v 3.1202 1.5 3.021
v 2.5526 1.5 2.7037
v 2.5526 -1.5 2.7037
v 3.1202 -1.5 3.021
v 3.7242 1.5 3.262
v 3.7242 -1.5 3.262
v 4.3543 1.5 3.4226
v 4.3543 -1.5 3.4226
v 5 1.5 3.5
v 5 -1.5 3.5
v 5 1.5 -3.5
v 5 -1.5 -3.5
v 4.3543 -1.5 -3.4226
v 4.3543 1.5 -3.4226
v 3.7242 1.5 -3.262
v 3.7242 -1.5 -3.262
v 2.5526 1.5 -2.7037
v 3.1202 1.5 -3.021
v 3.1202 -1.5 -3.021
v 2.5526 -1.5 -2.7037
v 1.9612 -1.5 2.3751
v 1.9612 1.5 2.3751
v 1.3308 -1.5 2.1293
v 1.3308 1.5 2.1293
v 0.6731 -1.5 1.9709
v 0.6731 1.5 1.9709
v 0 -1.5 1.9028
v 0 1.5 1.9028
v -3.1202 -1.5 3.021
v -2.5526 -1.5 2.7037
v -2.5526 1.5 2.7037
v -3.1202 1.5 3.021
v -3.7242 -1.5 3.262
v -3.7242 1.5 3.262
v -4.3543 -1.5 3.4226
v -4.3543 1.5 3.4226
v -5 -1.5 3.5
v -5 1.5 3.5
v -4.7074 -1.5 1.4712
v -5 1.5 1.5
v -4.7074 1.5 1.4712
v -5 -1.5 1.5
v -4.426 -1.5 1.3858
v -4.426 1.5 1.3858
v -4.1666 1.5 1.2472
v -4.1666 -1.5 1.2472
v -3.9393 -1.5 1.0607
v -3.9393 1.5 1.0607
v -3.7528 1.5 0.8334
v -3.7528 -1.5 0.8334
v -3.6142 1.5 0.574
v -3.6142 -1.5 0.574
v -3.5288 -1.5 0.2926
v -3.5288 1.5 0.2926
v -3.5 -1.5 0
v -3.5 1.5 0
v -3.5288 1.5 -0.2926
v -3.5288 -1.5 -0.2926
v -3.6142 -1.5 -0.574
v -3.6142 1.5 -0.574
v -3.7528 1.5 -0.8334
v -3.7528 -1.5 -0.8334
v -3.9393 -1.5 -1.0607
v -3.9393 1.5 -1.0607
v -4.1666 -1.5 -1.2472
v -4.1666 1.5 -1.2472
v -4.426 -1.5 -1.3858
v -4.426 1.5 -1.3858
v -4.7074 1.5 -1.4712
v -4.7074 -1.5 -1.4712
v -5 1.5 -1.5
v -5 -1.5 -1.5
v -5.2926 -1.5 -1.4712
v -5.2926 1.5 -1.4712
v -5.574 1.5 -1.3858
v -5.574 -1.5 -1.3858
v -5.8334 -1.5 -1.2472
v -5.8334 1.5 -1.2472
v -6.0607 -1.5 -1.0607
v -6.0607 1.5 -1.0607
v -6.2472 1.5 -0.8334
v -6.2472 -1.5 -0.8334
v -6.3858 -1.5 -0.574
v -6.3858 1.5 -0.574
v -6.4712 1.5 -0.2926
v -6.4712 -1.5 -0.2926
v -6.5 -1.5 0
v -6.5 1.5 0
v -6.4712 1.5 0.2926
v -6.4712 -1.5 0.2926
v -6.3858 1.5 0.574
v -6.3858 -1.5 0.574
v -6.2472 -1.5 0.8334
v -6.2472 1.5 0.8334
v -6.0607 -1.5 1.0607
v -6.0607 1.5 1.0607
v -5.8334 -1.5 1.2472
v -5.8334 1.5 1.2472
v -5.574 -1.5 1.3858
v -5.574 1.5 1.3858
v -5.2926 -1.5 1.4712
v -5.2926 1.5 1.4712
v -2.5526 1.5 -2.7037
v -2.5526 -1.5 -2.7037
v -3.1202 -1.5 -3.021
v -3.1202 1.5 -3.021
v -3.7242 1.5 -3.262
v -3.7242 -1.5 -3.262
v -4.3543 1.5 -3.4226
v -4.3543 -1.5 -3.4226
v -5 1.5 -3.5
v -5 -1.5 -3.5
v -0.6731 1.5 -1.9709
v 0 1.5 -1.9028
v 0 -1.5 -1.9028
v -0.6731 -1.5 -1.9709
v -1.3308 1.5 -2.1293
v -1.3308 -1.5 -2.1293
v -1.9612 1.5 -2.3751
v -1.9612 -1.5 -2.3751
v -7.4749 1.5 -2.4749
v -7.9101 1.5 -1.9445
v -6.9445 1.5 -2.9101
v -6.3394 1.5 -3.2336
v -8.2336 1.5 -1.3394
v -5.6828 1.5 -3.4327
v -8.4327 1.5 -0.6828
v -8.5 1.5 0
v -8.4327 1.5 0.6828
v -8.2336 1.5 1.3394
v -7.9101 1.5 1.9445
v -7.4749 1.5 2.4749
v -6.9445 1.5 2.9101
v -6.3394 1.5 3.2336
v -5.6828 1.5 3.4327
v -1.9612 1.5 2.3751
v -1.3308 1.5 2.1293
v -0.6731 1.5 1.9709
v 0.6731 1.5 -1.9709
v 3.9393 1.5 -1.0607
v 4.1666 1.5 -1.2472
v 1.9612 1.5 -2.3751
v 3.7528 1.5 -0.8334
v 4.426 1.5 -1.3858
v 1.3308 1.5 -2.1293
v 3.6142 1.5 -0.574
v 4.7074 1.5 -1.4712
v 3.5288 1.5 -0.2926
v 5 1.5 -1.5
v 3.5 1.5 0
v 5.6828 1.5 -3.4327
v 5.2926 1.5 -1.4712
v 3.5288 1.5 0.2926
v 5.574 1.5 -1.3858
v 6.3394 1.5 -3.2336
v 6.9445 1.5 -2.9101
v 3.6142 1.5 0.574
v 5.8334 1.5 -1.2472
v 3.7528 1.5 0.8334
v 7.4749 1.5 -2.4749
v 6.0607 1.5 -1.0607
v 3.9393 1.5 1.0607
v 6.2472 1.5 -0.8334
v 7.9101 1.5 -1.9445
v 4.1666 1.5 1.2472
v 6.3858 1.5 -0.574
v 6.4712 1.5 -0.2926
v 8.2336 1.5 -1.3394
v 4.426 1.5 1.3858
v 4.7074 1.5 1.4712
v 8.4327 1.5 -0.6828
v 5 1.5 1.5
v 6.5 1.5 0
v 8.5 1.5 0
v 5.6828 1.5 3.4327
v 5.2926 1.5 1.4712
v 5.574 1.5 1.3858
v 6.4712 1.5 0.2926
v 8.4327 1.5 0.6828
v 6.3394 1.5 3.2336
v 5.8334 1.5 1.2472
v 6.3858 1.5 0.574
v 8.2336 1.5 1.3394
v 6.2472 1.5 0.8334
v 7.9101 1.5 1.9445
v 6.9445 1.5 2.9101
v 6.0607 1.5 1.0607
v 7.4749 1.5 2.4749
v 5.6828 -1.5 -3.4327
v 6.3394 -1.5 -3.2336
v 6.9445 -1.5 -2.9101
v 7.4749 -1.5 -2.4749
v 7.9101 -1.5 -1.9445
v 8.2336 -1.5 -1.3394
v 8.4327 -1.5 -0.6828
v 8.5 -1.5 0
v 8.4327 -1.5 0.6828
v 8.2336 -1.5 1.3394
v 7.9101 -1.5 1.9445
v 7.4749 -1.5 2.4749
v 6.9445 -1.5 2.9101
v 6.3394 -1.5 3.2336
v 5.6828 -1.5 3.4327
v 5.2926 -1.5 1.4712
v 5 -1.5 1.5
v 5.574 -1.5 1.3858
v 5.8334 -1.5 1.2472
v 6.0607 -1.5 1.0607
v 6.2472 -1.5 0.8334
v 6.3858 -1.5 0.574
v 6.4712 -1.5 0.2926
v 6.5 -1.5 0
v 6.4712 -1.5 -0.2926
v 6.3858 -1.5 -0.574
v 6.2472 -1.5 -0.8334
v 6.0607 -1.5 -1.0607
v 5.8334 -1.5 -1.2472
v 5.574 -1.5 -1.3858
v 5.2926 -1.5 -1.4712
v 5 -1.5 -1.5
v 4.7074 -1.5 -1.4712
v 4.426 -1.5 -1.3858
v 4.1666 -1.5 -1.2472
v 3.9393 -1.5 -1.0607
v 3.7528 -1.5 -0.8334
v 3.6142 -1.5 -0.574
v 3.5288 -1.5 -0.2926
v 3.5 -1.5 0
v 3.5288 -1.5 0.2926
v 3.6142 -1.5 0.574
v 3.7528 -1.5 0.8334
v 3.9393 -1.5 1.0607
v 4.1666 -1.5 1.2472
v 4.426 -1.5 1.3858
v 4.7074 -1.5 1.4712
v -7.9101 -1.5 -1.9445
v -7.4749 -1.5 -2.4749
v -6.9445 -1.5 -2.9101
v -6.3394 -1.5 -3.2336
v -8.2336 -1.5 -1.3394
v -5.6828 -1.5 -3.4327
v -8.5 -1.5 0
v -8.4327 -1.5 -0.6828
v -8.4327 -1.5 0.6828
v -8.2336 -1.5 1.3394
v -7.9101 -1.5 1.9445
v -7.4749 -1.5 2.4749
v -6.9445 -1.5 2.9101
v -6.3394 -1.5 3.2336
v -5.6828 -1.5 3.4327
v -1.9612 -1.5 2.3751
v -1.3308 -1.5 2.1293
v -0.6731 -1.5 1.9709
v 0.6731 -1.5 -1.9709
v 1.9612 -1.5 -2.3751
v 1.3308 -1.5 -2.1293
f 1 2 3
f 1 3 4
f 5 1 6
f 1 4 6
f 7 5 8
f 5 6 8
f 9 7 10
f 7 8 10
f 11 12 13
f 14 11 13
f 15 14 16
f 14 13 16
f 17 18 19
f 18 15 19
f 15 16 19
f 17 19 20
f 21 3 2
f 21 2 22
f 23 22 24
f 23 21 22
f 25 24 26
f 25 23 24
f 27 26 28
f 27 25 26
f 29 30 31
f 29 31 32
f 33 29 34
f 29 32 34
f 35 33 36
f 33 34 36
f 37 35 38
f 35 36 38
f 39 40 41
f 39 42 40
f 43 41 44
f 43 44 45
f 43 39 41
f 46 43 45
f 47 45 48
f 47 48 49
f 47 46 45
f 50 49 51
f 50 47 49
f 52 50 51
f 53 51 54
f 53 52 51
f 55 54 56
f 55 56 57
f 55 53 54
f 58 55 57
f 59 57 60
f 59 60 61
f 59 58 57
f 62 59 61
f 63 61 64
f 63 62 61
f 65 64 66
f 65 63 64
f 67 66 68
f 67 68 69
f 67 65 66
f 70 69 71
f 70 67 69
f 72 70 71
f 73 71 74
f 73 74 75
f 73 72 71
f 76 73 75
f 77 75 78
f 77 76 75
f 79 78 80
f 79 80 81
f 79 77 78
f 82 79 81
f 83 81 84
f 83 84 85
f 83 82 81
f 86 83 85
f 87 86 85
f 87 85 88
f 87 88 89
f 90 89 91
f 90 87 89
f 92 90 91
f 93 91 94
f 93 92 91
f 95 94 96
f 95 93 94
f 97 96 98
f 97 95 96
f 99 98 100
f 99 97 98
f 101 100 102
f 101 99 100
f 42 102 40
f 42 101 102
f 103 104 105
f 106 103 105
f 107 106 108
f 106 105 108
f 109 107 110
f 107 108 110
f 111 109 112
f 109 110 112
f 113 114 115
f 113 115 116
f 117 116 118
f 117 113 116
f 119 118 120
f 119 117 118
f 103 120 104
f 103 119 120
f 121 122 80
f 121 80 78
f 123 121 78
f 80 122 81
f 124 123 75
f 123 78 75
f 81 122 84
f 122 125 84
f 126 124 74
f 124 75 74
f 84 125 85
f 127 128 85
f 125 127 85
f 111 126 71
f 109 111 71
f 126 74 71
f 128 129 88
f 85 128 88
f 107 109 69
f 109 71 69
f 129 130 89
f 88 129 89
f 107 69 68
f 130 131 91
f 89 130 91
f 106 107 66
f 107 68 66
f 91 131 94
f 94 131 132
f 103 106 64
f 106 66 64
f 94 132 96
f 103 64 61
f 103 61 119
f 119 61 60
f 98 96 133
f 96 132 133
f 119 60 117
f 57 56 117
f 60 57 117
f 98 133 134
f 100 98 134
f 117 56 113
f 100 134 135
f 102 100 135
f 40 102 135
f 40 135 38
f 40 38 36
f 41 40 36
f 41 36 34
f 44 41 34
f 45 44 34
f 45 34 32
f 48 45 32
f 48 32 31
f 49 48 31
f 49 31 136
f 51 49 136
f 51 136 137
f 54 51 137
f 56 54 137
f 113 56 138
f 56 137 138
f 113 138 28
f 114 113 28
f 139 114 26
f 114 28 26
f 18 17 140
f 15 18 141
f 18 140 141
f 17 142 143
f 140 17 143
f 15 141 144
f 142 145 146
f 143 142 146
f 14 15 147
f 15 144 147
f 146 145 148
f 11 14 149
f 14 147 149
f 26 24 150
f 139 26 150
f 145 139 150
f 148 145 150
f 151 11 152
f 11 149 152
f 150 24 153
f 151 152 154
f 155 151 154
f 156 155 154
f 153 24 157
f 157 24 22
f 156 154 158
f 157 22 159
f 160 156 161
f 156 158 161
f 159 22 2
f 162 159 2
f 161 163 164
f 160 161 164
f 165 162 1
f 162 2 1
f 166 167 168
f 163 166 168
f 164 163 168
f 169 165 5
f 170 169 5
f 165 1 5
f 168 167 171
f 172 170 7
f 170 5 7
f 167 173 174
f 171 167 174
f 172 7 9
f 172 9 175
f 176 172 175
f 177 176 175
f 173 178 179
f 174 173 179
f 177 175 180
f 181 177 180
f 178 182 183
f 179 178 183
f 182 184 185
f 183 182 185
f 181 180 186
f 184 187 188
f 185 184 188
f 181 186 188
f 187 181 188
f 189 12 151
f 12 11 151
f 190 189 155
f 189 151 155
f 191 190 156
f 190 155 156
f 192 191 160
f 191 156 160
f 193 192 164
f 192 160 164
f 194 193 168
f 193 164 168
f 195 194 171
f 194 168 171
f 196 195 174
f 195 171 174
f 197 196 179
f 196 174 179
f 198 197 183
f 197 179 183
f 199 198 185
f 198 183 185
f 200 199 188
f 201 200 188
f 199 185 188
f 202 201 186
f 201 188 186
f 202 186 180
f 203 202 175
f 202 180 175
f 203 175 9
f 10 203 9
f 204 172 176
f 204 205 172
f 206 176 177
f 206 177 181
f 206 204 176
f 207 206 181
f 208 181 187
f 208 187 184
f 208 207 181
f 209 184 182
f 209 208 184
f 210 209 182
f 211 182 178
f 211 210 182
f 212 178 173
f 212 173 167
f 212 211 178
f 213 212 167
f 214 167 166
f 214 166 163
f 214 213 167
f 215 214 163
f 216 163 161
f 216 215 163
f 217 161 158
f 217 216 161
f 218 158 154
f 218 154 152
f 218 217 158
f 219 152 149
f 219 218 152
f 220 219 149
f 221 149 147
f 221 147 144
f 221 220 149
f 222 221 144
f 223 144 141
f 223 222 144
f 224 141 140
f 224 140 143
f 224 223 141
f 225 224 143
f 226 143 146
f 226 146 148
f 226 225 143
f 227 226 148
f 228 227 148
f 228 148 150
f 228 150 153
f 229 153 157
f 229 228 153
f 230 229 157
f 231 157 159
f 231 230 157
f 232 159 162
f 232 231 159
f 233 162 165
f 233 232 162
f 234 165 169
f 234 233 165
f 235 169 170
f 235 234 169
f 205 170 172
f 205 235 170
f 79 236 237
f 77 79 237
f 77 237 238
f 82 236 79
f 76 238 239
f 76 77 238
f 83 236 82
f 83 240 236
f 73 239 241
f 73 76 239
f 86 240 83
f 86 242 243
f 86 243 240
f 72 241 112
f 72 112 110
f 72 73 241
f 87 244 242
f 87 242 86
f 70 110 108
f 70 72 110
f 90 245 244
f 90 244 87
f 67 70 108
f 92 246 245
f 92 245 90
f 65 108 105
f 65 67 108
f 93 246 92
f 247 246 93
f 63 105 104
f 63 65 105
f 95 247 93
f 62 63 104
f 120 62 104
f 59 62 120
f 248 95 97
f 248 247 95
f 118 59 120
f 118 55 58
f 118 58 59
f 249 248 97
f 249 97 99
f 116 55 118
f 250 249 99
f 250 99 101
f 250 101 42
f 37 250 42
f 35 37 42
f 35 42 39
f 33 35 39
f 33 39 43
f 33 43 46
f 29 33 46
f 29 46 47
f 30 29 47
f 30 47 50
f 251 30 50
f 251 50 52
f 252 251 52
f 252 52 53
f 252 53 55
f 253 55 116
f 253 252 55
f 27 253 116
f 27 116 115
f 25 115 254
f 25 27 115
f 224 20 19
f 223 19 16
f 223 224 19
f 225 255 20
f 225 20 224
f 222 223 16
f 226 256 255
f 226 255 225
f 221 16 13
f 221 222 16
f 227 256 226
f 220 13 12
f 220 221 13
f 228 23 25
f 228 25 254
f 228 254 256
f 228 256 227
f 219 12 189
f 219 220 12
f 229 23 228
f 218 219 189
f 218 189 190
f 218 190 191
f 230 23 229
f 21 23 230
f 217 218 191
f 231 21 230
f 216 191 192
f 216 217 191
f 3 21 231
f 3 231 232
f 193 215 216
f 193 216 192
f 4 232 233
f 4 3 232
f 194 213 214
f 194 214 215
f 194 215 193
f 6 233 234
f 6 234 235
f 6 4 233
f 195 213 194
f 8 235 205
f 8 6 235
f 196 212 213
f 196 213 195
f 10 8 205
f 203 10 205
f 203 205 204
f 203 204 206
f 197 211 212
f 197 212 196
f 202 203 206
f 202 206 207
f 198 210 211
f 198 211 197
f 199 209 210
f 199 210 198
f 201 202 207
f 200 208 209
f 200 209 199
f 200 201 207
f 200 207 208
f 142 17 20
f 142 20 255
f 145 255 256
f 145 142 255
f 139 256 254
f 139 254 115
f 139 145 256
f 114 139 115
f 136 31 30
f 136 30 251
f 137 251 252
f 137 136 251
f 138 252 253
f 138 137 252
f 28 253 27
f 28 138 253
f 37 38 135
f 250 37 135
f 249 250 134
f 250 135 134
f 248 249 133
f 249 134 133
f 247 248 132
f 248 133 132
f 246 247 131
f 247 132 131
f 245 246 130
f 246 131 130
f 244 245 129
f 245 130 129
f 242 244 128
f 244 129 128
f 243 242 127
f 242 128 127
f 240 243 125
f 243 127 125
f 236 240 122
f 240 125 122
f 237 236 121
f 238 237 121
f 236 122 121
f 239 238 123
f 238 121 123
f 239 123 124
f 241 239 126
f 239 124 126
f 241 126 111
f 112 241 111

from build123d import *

# Parameters (mm, degrees)
SKETCH1_R               = 1.5
BOSS_EXTRUDE1_DEPTH     = 1.5
CUT_EXTRUDE1_DEPTH      = 10.313968005
CUT_EXTRUDE1_DEPTH_BACK = 10.313968005
SKETCH2_W               = 7
SKETCH2_H               = 1.6
FILLET1_R               = 5
FILLET2_R               = 5


with BuildPart() as part:
    # Sketch1 → Boss-Extrude1 (new, symmetric)
    with BuildSketch(Plane(origin=(0, 0, 0), x_dir=(1, 0, 0), z_dir=(0, 1, 0))):
        with BuildLine():
            Line((-5, 3.5), (5, 3.5))
            ThreePointArc((5, 3.5), (8.5, 0), (5, -3.5))
            Line((5, -3.5), (-5, -3.5))
            ThreePointArc((-5, -3.5), (-8.5, 0), (-5, 3.5))
        make_face()
        with Locations(Location((-5, 0, 0), (0, 0, 270))):
            Circle(SKETCH1_R, mode=Mode.SUBTRACT)
        with Locations(Location((5, 0, 0), (0, 0, 270))):
            Circle(SKETCH1_R, mode=Mode.SUBTRACT)
    extrude(amount=BOSS_EXTRUDE1_DEPTH, both=True)

    # Sketch2 → Cut-Extrude1 (cut, two sides: drawn at the far end of the back side and taken through both)
    with BuildSketch(Plane(origin=(0, 0, 0), x_dir=(1, 0, 0), z_dir=(0, 1, 0)).offset(-CUT_EXTRUDE1_DEPTH_BACK)):
        with Locations((0, -2.7)):
            Rectangle(SKETCH2_W, SKETCH2_H)
        with Locations((0, 2.7)):
            Rectangle(SKETCH2_W, SKETCH2_H)
    extrude(amount=CUT_EXTRUDE1_DEPTH + CUT_EXTRUDE1_DEPTH_BACK, mode=Mode.SUBTRACT)

    # Fillet1
    # the kernel refuses this fillet: 5 mm, written as the material it adds along each edge
    with BuildSketch(Plane(origin=(-3.5, 1.5, 1.9), x_dir=(0, 0, 1), z_dir=(0, -1, 0)), Plane(origin=(3.5, 1.5, -1.9), x_dir=(0, 0, -1), z_dir=(0, -1, 0))) as fillet1_piece_1:
        with BuildLine():
            CenterArc((5, -3.666060556), FILLET1_R, 132.843643044, 47.156356956)
            Line((0, -3.666060556), (-0.1, -3.666060556))
            Line((-0.1, -3.666060556), (-0.1, 0))
            Line((-0.1, 0), (0, 0.1))
            ThreePointArc((0, 0.1), (0.8, 0.1), (1.532, 0.073321211))
            Line((1.532, 0.073321211), (1.6, 0))
        make_face()
    extrude(amount=3)
    with BuildSketch(Plane(origin=(-3.5, 1.5, -1.9), x_dir=(1, 0, 0), z_dir=(0, -1, 0))) as fillet1_piece_2:
        with BuildLine():
            CenterArc((3.666060556, -5), FILLET1_R, 90, 47.156356956)
            Line((0, -1.6), (-0.073321211, -1.532))
            ThreePointArc((-0.073321211, -1.532), (-0.1, -0.8), (-0.1, 0))
            Line((-0.1, 0), (0, 0.1))
            Line((0, 0.1), (3.666060556, 0.1))
            Line((3.666060556, 0.1), (3.666060556, 0))
        make_face()
    extrude(amount=3)
    with BuildSketch(Plane(origin=(3.5, -1.5, 1.9), x_dir=(-1, 0, 0), z_dir=(0, 1, 0))) as fillet1_piece_3:
        with BuildLine():
            CenterArc((3.666060556, 5), FILLET1_R, 222.843643044, 47.156356956)
            Line((0, 1.6), (-0.073321211, 1.532))
            ThreePointArc((-0.073321211, 1.532), (-0.1, 0.8), (-0.1, 0))
            Line((-0.1, 0), (0, -0.1))
            Line((0, -0.1), (3.666060556, -0.1))
            Line((3.666060556, -0.1), (3.666060556, 0))
        make_face()
    extrude(amount=3)

    # Fillet2
    # the kernel refuses this fillet: 5 mm, written as the material it takes off along each edge
    with BuildSketch(Plane(origin=(-3.5, 5.25, 3.5), x_dir=(0.7655176455574427, 0, -0.6434149006202682), z_dir=(0, -1, 0)), Plane(origin=(3.5, -5.25, 3.5), x_dir=(-0.7655176455574455, 0, -0.6434149006202647), z_dir=(0, 1, 0))) as fillet2_piece_1:
        with BuildLine():
            CenterArc((1.856470149, -4.961557983), FILLET2_R, 97.109423017, 29.828495219)
            Line((-1.148276468, -0.965122351), (0, 0))
            ThreePointArc((0, 0), (0.618823383, -0.038442017), (1.237646766, 0))
        make_face()
    extrude(amount=10.5, mode=Mode.SUBTRACT)
    with BuildSketch(Plane(origin=(-3.5, -5.25, -3.5), x_dir=(-1.0, 0, 2.909376443463916e-12), z_dir=(0, 1, 0))) as fillet2_piece_2:
        with BuildLine():
            CenterArc((1.771179679, 4.992640742), FILLET2_R, 237.062489078, 29.828495219)
            ThreePointArc((-0.947440439, 0.796320371), (-0.448986053, 0.427588228), (0, 0))
            Line((0, 0), (1.5, 0))
        make_face()
    extrude(amount=10.5, mode=Mode.SUBTRACT)
    with BuildSketch(Plane(origin=(3.5, -5.25, -3.5), x_dir=(-0.7655176455574453, 0, 0.6434149006202652), z_dir=(0, 1, 0))) as fillet2_piece_3:
        with BuildLine():
            CenterArc((1.856470149, 4.961557983), FILLET2_R, 233.062081764, 29.828495219)
            Line((-1.148276468, 0.965122351), (0, 0))
            ThreePointArc((0, 0), (0.618823383, 0.038442017), (1.237646766, 0))
        make_face()
    extrude(amount=10.5, mode=Mode.SUBTRACT)


solid = part.part
